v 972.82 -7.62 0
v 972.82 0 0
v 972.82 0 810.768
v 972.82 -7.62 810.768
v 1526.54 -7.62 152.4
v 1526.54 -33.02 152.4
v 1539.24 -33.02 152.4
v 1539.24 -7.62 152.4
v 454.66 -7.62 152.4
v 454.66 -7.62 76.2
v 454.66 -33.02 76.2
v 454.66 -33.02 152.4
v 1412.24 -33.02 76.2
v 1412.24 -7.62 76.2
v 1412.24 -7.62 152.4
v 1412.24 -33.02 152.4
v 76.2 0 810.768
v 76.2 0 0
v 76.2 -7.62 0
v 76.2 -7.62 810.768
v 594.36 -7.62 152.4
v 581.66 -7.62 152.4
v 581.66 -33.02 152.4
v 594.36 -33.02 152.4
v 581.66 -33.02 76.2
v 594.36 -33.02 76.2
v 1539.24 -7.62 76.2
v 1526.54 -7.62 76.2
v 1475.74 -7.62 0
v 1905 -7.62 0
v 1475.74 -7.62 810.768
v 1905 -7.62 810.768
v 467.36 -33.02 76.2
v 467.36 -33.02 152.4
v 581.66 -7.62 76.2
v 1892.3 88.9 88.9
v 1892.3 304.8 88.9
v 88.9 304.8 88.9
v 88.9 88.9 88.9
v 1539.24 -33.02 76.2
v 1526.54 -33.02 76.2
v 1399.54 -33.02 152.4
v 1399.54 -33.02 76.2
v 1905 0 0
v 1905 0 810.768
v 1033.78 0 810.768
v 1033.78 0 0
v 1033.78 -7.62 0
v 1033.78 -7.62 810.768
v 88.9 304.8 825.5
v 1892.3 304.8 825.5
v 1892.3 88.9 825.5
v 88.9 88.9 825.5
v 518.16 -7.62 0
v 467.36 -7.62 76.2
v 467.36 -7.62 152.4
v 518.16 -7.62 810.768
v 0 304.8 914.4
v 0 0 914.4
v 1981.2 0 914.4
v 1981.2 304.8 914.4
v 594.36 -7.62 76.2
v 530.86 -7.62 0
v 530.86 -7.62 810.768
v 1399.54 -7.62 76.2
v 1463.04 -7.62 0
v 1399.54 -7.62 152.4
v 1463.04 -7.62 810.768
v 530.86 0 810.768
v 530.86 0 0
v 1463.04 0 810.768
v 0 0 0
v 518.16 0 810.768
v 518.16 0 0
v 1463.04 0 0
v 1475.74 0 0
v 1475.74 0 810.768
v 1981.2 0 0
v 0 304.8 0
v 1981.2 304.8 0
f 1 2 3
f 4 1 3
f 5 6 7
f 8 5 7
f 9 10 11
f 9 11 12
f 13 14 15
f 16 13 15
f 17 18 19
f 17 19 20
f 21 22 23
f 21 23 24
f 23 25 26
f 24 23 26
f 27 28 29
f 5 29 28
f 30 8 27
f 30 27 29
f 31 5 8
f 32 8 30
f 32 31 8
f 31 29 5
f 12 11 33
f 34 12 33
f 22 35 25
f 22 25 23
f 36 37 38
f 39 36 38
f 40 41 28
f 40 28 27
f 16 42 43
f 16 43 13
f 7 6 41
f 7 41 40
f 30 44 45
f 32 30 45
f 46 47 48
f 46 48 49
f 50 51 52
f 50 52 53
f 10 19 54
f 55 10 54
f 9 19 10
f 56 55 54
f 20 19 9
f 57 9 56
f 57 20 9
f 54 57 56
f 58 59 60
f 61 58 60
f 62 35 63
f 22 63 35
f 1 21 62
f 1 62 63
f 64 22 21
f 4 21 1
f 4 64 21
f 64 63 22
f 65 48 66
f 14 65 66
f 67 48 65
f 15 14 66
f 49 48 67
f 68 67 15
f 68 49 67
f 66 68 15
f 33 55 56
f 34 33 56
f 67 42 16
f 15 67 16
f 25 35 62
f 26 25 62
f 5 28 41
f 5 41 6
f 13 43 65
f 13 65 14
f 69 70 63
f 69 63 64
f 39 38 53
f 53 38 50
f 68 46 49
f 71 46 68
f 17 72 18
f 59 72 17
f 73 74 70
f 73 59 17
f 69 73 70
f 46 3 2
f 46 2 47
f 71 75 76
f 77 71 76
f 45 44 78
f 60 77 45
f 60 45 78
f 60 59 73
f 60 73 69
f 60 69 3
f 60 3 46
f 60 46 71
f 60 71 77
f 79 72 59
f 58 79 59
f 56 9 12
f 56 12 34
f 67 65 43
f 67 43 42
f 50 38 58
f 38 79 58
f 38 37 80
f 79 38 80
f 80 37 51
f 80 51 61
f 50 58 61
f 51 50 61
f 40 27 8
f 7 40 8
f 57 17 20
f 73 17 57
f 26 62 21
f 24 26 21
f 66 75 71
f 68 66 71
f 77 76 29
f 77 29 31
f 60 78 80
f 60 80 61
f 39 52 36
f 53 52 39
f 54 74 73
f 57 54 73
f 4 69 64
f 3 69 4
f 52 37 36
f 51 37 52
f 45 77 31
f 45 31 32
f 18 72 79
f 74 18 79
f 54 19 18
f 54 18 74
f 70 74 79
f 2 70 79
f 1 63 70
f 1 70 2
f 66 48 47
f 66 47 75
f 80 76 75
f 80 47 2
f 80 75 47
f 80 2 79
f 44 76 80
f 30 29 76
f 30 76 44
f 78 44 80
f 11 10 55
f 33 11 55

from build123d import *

# Parameters (mm, degrees)
F0_W     = 1981.2
F0_H     = 914.4
F1_DEPTH = 304.8
F2_W     = 441.96
F2_H     = 810.768
F2_W_2   = 429.26
F3_DEPTH = 7.62
F4_W     = 12.7
F4_H     = 76.2
F5_DEPTH = 25.4
F6_W     = 1803.4
F6_H     = 736.6
F7_DEPTH = 215.9


with BuildPart() as f1:
    # F0 (on Front) → F1 (new body)
    with BuildSketch(Plane.XZ):
        with Locations((990.6, 457.2)):
            Rectangle(F0_W, F0_H)
    extrude(amount=-F1_DEPTH)

    # F2 (on face) → F3 (join)
    with BuildSketch(Plane.XZ):
        with Locations((297.18, 405.384)):
            Rectangle(F2_W, F2_H)
        with Locations((751.84, 405.384)):
            Rectangle(F2_W, F2_H)
        with Locations((1248.41, 405.384)):
            Rectangle(F2_W_2, F2_H)
        with Locations((1690.37, 405.384)):
            Rectangle(F2_W_2, F2_H)
    extrude(amount=F3_DEPTH)

    # F4 (on face) → F5 (join)
    with BuildSketch(Plane.XZ.offset(7.62)):
        with Locations((1532.89, 114.3)):
            Rectangle(F4_W, F4_H)
        with Locations((1405.89, 114.3)):
            Rectangle(F4_W, F4_H)
        with Locations((588.01, 114.3)):
            Rectangle(F4_W, F4_H)
        with Locations((461.01, 114.3)):
            Rectangle(F4_W, F4_H)
    extrude(amount=F5_DEPTH)

    # F6 (on face) → F7 (cut)
    with BuildSketch(Plane(origin=(0, 304.8, 0), x_dir=(-1, 0, 0), z_dir=(0, 1, 0))):
        with Locations((-990.6, 457.2)):
            Rectangle(F6_W, F6_H)
    extrude(amount=-F7_DEPTH, mode=Mode.SUBTRACT)


solid = f1.part
